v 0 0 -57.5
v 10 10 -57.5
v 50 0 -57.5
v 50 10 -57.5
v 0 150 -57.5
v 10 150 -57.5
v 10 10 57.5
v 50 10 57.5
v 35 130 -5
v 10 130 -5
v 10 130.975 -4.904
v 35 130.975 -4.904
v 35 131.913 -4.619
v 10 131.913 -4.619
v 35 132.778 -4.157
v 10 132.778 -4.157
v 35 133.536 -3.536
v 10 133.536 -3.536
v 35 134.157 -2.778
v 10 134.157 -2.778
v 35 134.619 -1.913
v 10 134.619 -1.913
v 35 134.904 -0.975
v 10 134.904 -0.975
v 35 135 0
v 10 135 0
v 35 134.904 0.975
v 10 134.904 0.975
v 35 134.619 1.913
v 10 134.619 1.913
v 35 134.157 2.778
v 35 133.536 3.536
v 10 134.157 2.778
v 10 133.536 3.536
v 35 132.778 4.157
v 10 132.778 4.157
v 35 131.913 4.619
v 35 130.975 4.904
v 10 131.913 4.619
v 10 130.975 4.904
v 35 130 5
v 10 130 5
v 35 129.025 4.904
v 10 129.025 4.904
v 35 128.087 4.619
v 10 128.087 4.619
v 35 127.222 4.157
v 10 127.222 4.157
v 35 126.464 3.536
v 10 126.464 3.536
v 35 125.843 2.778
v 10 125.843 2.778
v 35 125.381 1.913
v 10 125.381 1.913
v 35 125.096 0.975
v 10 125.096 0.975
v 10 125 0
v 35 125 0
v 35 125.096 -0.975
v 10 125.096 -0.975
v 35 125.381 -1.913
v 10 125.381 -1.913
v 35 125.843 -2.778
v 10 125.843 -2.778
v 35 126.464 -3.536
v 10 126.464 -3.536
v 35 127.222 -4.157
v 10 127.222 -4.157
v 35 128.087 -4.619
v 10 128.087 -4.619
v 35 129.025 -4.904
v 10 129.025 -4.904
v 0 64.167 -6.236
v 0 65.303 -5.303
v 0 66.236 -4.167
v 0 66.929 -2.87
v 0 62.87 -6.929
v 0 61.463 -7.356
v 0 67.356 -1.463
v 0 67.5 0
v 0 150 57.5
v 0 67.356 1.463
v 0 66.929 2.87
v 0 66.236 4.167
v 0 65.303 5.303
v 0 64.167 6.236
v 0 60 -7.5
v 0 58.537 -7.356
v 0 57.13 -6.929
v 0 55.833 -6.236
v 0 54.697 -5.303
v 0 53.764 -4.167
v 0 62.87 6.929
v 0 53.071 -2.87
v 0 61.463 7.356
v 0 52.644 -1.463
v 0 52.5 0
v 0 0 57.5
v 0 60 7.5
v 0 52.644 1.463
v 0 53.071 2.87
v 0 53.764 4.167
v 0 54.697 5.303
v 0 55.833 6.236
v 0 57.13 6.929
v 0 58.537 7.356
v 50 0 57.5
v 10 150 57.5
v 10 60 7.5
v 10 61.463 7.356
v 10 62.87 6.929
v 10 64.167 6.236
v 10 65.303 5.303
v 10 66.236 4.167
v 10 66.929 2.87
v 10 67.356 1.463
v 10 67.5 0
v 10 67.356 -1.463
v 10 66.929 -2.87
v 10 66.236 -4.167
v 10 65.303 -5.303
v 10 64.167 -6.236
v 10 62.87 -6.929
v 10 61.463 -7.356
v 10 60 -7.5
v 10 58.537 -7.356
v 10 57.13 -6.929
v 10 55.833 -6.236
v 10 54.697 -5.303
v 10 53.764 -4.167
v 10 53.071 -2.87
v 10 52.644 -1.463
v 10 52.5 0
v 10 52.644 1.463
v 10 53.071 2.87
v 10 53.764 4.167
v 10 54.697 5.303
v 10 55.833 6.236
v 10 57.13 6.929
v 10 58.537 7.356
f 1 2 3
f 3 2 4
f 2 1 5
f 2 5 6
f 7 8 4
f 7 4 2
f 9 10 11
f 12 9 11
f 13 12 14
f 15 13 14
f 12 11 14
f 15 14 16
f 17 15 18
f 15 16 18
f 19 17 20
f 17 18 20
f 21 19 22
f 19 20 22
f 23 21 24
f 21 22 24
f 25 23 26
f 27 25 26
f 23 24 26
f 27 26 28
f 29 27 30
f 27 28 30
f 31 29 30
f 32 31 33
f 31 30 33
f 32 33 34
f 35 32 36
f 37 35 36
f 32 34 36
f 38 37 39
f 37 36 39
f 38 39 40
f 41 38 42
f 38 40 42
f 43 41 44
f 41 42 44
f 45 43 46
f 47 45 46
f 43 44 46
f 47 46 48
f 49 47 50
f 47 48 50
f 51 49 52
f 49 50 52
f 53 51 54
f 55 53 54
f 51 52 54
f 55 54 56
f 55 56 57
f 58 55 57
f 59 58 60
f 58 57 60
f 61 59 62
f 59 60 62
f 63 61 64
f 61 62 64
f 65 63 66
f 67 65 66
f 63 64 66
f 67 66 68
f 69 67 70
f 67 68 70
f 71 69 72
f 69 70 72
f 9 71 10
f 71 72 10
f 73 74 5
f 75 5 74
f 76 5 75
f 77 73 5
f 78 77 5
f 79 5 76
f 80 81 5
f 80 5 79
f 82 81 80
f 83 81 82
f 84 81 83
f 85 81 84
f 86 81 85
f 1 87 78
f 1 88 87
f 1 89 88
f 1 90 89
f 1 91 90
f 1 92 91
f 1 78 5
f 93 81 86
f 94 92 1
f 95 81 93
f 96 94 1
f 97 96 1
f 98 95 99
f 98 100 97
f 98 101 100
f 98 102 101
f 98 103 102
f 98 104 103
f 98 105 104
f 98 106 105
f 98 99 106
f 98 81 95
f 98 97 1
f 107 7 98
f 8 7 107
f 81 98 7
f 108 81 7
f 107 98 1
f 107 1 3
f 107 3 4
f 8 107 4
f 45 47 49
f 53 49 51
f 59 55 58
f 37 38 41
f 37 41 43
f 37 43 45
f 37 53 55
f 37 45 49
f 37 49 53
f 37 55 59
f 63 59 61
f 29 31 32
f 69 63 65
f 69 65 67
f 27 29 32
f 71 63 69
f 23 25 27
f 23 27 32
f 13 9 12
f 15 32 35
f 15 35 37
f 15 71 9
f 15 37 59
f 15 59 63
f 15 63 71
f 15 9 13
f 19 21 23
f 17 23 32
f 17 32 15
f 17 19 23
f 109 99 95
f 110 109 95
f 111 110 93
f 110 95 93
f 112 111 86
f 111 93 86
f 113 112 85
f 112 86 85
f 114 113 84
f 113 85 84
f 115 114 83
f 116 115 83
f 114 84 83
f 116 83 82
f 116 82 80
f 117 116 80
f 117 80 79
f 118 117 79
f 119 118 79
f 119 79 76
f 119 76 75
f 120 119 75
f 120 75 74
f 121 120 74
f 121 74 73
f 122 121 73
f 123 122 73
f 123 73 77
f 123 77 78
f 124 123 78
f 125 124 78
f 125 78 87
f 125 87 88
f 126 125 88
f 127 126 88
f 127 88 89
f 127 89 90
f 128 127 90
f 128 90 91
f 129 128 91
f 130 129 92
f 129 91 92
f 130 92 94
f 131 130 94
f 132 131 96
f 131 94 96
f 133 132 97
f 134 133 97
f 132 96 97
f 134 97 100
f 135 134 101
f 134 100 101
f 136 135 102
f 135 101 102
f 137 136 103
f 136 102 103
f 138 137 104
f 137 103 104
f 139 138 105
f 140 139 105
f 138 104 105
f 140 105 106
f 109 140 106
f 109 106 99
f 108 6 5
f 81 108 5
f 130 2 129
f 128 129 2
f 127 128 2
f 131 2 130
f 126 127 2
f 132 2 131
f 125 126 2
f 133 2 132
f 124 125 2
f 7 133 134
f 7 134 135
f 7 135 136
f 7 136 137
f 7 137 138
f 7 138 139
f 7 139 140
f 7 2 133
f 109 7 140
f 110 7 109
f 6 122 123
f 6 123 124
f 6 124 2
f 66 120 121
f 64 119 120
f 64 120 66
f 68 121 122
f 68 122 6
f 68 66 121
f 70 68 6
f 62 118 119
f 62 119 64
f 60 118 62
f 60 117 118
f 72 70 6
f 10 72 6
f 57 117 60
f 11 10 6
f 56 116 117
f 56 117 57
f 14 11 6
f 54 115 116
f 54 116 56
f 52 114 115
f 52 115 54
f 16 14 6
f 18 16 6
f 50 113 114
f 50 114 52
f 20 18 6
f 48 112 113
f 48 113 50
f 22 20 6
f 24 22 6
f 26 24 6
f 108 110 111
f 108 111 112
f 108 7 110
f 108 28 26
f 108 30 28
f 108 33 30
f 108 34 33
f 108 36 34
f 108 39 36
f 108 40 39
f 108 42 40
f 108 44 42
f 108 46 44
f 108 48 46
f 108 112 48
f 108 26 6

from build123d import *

# Parameters (mm, degrees)
BOSS_EXTRUDE1_DEPTH = 57.5
SKETCH2_R           = 7.5
CUT_EXTRUDE1_DEPTH  = 51
SKETCH3_R           = 5
BOSS_EXTRUDE2_DEPTH = 25


with BuildPart() as part:
    # Sketch1 → Boss-Extrude1 (new body, symmetric)
    with BuildSketch(Plane.XY):
        Polygon((0, 150), (0, 0), (50, 0), (50, 10), (10, 10), (10, 150), align=None)
    extrude(amount=BOSS_EXTRUDE1_DEPTH, both=True)

    # Sketch2 → Cut-Extrude1 (cut, through all)
    with BuildSketch(Plane.ZY):
        with Locations((0, 60)):
            Circle(SKETCH2_R)
    extrude(amount=-CUT_EXTRUDE1_DEPTH, mode=Mode.SUBTRACT)

    # Sketch3 → Boss-Extrude2 (add)
    with BuildSketch(Plane(origin=(10, 0, 0), x_dir=(0, 0, -1), z_dir=(1, 0, 0))):
        with Locations((0, 130)):
            Circle(SKETCH3_R)
    extrude(amount=BOSS_EXTRUDE2_DEPTH)


solid = part.part
